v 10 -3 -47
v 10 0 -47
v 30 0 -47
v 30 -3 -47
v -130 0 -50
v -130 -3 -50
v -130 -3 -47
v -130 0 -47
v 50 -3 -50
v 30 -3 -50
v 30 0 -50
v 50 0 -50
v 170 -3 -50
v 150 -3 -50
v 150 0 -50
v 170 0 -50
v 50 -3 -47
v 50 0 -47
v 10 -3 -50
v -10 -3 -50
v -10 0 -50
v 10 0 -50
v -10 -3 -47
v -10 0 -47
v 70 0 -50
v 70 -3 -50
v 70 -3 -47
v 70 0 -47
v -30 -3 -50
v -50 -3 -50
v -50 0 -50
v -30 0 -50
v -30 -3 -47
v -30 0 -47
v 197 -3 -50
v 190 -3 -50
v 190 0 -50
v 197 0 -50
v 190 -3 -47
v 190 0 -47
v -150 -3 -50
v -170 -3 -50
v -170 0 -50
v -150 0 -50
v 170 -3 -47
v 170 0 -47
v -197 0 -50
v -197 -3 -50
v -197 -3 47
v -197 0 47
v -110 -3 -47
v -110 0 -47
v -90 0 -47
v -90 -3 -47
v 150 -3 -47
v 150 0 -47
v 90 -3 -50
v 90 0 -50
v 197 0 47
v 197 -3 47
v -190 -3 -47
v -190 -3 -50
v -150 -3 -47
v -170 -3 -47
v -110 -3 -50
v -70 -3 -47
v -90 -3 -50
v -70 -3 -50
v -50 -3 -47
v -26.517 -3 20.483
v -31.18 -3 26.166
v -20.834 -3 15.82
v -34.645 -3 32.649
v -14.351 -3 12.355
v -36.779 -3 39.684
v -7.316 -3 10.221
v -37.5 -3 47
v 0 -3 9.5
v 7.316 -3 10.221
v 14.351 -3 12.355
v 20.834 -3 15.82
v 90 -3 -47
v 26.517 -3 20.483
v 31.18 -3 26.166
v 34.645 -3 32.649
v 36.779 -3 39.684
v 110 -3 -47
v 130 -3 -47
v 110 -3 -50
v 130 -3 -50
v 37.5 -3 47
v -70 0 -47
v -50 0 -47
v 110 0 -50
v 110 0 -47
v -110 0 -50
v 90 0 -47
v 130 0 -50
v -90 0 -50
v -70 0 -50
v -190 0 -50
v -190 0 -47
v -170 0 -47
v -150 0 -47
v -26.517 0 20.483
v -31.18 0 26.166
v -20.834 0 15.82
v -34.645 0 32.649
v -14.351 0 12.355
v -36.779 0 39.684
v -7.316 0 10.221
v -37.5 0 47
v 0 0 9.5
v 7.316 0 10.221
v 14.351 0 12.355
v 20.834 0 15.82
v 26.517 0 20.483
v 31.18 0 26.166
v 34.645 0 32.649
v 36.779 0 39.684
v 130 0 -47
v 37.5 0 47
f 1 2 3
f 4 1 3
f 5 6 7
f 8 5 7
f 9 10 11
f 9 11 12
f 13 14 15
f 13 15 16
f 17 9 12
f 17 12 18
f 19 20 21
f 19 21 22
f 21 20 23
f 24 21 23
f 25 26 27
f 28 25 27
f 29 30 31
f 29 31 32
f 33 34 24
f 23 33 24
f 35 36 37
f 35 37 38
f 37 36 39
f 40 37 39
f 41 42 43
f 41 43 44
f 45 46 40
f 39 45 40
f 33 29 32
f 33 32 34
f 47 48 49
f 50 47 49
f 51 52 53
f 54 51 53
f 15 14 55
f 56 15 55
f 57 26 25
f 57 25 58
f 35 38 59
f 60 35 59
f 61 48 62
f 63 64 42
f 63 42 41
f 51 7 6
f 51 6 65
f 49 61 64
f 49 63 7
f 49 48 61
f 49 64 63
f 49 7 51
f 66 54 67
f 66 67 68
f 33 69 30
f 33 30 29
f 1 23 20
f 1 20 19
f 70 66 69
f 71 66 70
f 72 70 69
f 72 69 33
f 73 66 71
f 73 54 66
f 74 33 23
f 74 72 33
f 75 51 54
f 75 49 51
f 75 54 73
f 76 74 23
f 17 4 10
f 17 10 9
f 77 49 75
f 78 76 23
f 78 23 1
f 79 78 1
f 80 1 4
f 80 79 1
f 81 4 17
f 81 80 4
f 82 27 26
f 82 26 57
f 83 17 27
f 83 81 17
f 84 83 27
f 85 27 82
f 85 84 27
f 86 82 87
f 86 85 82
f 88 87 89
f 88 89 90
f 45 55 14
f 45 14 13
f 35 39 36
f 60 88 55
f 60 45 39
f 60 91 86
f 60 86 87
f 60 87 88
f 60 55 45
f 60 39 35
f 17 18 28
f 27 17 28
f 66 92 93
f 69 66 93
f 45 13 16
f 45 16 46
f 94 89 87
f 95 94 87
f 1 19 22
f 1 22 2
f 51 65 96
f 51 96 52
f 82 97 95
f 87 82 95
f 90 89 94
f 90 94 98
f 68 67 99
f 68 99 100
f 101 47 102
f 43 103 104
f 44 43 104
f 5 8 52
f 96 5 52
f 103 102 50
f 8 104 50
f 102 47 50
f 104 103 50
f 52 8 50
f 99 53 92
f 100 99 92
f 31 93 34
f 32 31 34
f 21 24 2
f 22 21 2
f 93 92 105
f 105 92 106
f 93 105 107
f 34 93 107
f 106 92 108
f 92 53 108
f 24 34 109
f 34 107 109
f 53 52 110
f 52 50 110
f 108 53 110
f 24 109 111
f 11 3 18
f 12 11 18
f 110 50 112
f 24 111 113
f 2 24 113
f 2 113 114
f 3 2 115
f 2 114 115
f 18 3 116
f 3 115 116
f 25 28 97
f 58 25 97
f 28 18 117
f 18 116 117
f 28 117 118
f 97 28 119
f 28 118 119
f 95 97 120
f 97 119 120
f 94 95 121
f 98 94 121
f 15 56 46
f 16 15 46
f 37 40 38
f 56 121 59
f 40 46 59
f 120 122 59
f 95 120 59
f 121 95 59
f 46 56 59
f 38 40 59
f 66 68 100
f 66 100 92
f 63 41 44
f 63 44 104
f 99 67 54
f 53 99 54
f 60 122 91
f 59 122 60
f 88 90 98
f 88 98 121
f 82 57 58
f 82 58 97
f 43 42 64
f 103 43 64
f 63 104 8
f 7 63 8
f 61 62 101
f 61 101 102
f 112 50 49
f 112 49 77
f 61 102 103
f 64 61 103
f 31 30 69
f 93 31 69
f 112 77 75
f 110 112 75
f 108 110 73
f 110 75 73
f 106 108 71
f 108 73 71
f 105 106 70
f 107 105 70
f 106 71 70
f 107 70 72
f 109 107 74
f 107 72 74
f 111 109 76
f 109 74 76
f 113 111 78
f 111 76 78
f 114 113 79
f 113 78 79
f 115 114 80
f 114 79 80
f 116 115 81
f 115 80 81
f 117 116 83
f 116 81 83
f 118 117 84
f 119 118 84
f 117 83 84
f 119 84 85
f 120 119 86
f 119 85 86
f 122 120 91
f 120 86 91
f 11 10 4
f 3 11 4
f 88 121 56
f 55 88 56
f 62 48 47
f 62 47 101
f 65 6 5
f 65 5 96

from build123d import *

# Parameters (mm, degrees)
F0_W     = 394
F0_H     = 94
F1_DEPTH = 3
F2_W     = 7
F2_H     = 3
F2_W_2   = 20
F3_DEPTH = 3
F4_R     = 37.5
F5_DEPTH = 25


with BuildPart() as f1:
    # F0 (on Front) → F1 (new body)
    with BuildSketch(Plane.XZ):
        Rectangle(F0_W, F0_H)
    extrude(amount=F1_DEPTH)

    # F2 (on face) → F3 (join, through all)
    with BuildSketch(Plane.XZ.offset(3)):
        with Locations((-193.5, -48.5)):
            Rectangle(F2_W, F2_H)
        with Locations((193.5, -48.5)):
            Rectangle(F2_W, F2_H)
        with Locations((-160, -48.5)):
            Rectangle(F2_W_2, F2_H)
        with Locations((-120, -48.5)):
            Rectangle(F2_W_2, F2_H)
        with Locations((-80, -48.5)):
            Rectangle(F2_W_2, F2_H)
        with Locations((-40, -48.5)):
            Rectangle(F2_W_2, F2_H)
        with Locations((0, -48.5)):
            Rectangle(F2_W_2, F2_H)
        with Locations((40, -48.5)):
            Rectangle(F2_W_2, F2_H)
        with Locations((80, -48.5)):
            Rectangle(F2_W_2, F2_H)
        with Locations((120, -48.5)):
            Rectangle(F2_W_2, F2_H)
        with Locations((160, -48.5)):
            Rectangle(F2_W_2, F2_H)
    extrude(amount=-F3_DEPTH)

    # F4 (on face) → F5 (cut)
    with BuildSketch(Plane.XZ.offset(3)):
        with Locations((0, 47)):
            Circle(F4_R)
    extrude(amount=-F5_DEPTH, mode=Mode.SUBTRACT)


solid = f1.part
